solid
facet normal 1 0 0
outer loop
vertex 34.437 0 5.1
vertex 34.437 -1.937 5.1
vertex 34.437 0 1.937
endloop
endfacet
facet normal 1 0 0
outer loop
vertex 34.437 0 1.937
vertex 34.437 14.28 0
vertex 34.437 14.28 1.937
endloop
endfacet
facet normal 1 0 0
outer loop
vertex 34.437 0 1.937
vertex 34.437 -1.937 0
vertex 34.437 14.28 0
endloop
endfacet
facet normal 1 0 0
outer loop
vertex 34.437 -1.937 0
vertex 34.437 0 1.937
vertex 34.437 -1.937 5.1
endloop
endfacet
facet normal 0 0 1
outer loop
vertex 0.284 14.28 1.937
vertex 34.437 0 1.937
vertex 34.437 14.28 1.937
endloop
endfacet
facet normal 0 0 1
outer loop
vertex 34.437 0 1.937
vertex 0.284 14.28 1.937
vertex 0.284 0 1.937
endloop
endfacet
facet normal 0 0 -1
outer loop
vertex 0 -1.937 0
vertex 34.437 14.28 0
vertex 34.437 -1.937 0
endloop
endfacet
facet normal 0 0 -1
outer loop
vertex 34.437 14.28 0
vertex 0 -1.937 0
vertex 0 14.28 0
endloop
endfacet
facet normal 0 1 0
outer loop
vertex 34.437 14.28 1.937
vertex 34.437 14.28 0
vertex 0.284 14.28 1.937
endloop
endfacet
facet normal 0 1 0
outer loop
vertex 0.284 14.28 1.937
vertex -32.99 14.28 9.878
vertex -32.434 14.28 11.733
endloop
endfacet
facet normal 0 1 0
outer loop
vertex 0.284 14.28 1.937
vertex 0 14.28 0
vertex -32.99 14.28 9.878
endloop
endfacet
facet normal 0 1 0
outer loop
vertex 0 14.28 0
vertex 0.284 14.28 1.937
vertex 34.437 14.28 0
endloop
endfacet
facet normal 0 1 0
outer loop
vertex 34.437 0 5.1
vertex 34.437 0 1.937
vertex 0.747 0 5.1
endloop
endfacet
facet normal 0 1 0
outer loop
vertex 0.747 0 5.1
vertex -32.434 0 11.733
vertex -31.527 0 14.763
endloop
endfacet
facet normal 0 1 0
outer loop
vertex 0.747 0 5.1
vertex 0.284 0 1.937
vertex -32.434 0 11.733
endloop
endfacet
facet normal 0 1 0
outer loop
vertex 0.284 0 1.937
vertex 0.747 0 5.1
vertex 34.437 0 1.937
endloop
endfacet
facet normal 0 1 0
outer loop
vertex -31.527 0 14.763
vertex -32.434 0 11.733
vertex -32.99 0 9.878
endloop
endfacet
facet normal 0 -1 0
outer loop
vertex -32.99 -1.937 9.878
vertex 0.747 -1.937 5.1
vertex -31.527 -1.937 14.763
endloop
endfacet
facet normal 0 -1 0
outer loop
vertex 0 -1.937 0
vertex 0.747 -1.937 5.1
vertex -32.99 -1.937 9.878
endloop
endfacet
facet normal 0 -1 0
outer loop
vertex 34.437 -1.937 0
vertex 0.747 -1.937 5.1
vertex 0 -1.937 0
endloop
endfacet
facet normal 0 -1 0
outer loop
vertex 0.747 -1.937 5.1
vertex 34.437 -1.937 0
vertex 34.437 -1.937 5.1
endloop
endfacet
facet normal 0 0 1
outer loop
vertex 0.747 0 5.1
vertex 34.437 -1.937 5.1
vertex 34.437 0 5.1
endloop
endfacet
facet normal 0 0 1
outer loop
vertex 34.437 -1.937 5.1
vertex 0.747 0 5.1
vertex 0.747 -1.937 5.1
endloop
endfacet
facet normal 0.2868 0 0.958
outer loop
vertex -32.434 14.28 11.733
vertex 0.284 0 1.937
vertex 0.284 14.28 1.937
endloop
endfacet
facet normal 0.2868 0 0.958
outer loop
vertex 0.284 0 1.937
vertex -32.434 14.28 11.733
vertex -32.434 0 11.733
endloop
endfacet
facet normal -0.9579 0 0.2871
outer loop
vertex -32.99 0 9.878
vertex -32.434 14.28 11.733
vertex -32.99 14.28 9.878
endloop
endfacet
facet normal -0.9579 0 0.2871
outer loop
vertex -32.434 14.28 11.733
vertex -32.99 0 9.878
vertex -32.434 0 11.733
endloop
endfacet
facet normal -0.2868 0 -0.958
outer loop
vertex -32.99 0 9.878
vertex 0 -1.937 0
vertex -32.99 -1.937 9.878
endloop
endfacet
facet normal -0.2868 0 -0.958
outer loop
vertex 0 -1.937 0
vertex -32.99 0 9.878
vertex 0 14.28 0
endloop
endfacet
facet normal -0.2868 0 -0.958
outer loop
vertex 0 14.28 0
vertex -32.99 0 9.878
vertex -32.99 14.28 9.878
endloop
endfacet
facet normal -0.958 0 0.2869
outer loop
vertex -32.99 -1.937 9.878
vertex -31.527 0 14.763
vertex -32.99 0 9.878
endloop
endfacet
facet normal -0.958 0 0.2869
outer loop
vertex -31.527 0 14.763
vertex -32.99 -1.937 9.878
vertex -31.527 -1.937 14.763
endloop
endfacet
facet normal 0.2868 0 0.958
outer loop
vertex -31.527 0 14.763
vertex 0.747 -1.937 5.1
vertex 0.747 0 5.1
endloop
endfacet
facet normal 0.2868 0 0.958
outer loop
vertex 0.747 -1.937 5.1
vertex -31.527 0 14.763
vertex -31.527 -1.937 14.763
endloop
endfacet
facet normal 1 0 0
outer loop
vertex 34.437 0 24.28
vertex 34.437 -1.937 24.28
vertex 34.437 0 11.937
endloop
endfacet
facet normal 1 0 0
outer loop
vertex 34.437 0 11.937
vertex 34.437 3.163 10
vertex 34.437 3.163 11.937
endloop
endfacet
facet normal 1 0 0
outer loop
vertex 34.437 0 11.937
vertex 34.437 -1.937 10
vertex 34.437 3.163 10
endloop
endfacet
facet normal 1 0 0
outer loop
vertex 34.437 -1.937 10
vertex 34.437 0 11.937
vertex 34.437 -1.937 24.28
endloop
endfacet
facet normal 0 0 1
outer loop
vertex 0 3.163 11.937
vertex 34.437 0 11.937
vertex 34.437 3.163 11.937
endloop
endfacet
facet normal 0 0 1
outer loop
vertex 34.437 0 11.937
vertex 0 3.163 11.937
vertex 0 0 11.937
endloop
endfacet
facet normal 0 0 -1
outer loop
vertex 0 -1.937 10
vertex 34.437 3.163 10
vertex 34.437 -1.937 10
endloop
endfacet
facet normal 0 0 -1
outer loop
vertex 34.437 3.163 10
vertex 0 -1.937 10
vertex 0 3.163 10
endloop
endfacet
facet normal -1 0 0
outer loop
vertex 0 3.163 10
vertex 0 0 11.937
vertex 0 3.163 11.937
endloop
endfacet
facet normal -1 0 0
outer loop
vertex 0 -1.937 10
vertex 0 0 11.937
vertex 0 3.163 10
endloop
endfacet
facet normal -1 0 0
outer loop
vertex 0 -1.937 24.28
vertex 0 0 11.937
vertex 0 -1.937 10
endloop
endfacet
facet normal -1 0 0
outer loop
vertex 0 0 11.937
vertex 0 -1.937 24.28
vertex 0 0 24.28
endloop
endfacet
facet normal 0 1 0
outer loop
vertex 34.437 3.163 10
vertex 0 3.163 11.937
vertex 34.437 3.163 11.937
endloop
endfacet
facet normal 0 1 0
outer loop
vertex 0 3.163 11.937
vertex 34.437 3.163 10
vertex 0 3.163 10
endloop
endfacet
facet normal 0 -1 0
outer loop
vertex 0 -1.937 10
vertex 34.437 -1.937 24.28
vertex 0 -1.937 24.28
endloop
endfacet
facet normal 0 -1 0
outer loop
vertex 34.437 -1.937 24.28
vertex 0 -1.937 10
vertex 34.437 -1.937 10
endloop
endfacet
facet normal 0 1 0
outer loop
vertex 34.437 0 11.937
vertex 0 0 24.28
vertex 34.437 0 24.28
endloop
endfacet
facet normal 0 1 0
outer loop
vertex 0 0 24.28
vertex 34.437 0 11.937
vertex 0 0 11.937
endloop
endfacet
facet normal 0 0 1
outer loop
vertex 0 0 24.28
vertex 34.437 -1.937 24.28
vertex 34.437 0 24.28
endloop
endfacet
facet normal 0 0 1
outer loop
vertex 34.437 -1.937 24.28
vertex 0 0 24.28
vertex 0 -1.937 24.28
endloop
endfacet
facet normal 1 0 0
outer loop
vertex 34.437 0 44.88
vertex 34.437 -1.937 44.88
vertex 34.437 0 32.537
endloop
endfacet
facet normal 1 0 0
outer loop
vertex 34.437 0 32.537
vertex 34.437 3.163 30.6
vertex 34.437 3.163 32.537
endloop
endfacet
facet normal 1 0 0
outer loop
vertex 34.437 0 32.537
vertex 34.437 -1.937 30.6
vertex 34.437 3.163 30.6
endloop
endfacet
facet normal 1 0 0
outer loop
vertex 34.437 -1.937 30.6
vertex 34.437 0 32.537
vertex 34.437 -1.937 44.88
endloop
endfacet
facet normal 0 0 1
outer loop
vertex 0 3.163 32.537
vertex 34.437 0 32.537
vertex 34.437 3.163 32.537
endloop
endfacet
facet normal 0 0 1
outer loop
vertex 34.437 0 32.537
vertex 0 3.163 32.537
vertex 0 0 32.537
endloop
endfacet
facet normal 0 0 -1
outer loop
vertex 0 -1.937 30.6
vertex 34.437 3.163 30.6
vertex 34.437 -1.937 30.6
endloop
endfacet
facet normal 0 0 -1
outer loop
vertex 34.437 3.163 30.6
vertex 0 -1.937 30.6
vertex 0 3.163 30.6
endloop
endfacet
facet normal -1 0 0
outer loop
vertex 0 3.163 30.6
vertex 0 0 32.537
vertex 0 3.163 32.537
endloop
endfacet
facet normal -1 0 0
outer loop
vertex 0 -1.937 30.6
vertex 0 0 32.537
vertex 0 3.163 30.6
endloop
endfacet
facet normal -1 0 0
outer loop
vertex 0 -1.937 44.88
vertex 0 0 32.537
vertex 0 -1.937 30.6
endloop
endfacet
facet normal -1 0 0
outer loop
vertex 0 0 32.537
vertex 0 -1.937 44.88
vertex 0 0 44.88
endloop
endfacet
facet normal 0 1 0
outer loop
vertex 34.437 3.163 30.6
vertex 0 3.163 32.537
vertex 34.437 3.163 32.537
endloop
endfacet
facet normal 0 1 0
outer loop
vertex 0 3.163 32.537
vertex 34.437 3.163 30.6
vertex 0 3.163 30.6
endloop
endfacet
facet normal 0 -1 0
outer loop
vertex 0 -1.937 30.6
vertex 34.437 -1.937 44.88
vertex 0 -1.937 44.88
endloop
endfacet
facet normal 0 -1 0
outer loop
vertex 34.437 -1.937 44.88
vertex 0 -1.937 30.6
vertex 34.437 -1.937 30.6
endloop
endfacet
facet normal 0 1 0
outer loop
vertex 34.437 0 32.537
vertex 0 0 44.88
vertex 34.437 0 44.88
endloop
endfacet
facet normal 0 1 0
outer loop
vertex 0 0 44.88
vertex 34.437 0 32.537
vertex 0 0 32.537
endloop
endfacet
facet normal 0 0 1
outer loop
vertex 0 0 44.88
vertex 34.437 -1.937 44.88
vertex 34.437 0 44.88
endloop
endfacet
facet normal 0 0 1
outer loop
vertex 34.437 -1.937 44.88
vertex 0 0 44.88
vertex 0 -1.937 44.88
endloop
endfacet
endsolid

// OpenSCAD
coldiameter = 17;
mod = coldiameter;					//this is the diameter of a column
cpo = mod/10; 						// capitol offset, to determine depth
depth = (mod + (cpo*2))* 1.0;  	//allows over or under hang if desired

//height = mod * 6;					//height of a column if you use this comment out the one below
ch = mod*5* 1.24;					//height of a column
//length = 90;
//width = (length * 7/6) * .618;  					//golden rectangle
//length = ch * .618;  								// for golden rectangle

n_o_c = 6;											//number of columns across front of temple
length = ((ch*1.618)*1.618)/(n_o_c-1); 		//comment either this or the other def out before compiling
echo ("Length",length);							//if used, front of temple is golden rectangle
p_overhang = mod;
p_width = (length * (n_o_c-1)) + + mod + p_overhang;	//overall width of pediment
echo("p_width=", p_width);
p_length = p_width/4;
echo("p_length=", p_length);

height = ch/15;

f_height = height*2;		  //frieze height
c_height = height *2/3;		  //cornice height
p_height = (ch * .618) - f_height - c_height;
echo("p_height", p_height);
angle = atan(p_height/(p_width/2));
echo("angle=",angle);
hl = p_length/cos(angle)*1.02;

//pediment_end();
//pediment_middle();
join_plates();

module pediment_end() {
	cube([p_length,depth,p_length/50]);												//base
	translate([p_length/5,0,0]) cube([p_length*.8,p_length/40,p_length/15]);	//back flange
	difference() {
		union() {
			rotate([0,-angle,0]) translate([0,0,-p_length/30])
				cube([hl,depth*.9,p_length/25]);										//lower top
			rotate([0,-angle,0])	translate([0,0,0]) 
				cube([p_length*1.05,depth,p_length/40]);							//upper top
						//top flange
			rotate([0,-angle,0])	translate([p_length/5,0,-p_length/12.5]) 
				cube([hl*.8,p_length/40,p_length/15]);								//top flange
		}
	translate([p_length,0,0]) cube([p_length/25,depth,p_length/2]);			//make far end vertical
	translate([0,0,-p_length/25]) cube([p_length,depth,p_length/25]);			//smooth bottom
	rotate([0,-angle,0])	translate([p_length*.8,0,-depth/12.5]) 					//slot 
		cube([p_length/4,depth*.75,p_length/30]);
	}
}


module pediment_middle() {
	cube([p_length,depth,p_length/50]);											//base
	cube([p_length,p_length/40,p_length/15]);										//back flange
	difference() {
		union() {
			rotate([0,-angle],0) translate([0,0,p_length/8])
				cube([hl*1.05,depth*.9,p_length/25]);								//lower top
			rotate([0,-angle,0])	translate([0,0,p_length/8+p_length/25]) 
				cube([hl*1.05,depth,p_length/40]);									//upper top
			rotate([0,-angle,0])	translate([0,0,p_length/15]) 
				cube([hl*1.05,p_length/40,p_length/15]);							//top flange
		}
	translate([p_length,0,0]) cube([p_length/12,depth,p_length/1.5]);			//make far end vertical
	translate([-p_length/12,0,0]) cube([p_length/12,depth,p_length/2]);		//make near end vertical
	//translate([0,0,-p_length/25]) cube([p_length,depth,p_length/25]);		//smooth bottom
	rotate([0,-angle,0])	translate([p_length*.0,0,depth/10+p_length/8.75])	//lower slot 
		cube([p_length/4,depth*.75,p_length/30]);
	rotate([0,-angle,0])	translate([hl*.8,0,depth/10+p_length/8.75])			//upper slot 
		cube([p_length/4,depth*.75,p_length/30]);
	}
}

module join_plates() {
	cube([p_length/2.25,depth*.7,p_length/40]);								//center angle joiner right
	rotate([90,0,0]) cube([p_length/2.25,depth*.25,p_length/40]);			//center angle joiner flange right
	
	rotate([0,angle,0]) translate([-p_length/2.25,0,0])						//center angle joiner left 
		cube([p_length/2.25,depth*.70,p_length/40]);
	rotate([90,angle,0]) translate([-p_length/2.25,0,0]) 						//center angle joiner flange left
		cube([p_length/2.25,depth*.25,p_length/40]);

	translate([0,-p_length/40,10]) 
		cube([p_length/2.25,depth*.25,p_length/40]);
	rotate([90,0,0]) translate([0,10,0]) 											//base plate
		cube([p_length/2.25,depth*.7,p_length/40]);

	translate([0,-p_length/40,depth*1.5]) 
		cube([p_length/2.25,depth*.25,p_length/40]);
	rotate([90,0,0]) translate([0,depth*1.5,0])  								//base plate #2
		cube([p_length/2.25,depth*.7,p_length/40]);
}
